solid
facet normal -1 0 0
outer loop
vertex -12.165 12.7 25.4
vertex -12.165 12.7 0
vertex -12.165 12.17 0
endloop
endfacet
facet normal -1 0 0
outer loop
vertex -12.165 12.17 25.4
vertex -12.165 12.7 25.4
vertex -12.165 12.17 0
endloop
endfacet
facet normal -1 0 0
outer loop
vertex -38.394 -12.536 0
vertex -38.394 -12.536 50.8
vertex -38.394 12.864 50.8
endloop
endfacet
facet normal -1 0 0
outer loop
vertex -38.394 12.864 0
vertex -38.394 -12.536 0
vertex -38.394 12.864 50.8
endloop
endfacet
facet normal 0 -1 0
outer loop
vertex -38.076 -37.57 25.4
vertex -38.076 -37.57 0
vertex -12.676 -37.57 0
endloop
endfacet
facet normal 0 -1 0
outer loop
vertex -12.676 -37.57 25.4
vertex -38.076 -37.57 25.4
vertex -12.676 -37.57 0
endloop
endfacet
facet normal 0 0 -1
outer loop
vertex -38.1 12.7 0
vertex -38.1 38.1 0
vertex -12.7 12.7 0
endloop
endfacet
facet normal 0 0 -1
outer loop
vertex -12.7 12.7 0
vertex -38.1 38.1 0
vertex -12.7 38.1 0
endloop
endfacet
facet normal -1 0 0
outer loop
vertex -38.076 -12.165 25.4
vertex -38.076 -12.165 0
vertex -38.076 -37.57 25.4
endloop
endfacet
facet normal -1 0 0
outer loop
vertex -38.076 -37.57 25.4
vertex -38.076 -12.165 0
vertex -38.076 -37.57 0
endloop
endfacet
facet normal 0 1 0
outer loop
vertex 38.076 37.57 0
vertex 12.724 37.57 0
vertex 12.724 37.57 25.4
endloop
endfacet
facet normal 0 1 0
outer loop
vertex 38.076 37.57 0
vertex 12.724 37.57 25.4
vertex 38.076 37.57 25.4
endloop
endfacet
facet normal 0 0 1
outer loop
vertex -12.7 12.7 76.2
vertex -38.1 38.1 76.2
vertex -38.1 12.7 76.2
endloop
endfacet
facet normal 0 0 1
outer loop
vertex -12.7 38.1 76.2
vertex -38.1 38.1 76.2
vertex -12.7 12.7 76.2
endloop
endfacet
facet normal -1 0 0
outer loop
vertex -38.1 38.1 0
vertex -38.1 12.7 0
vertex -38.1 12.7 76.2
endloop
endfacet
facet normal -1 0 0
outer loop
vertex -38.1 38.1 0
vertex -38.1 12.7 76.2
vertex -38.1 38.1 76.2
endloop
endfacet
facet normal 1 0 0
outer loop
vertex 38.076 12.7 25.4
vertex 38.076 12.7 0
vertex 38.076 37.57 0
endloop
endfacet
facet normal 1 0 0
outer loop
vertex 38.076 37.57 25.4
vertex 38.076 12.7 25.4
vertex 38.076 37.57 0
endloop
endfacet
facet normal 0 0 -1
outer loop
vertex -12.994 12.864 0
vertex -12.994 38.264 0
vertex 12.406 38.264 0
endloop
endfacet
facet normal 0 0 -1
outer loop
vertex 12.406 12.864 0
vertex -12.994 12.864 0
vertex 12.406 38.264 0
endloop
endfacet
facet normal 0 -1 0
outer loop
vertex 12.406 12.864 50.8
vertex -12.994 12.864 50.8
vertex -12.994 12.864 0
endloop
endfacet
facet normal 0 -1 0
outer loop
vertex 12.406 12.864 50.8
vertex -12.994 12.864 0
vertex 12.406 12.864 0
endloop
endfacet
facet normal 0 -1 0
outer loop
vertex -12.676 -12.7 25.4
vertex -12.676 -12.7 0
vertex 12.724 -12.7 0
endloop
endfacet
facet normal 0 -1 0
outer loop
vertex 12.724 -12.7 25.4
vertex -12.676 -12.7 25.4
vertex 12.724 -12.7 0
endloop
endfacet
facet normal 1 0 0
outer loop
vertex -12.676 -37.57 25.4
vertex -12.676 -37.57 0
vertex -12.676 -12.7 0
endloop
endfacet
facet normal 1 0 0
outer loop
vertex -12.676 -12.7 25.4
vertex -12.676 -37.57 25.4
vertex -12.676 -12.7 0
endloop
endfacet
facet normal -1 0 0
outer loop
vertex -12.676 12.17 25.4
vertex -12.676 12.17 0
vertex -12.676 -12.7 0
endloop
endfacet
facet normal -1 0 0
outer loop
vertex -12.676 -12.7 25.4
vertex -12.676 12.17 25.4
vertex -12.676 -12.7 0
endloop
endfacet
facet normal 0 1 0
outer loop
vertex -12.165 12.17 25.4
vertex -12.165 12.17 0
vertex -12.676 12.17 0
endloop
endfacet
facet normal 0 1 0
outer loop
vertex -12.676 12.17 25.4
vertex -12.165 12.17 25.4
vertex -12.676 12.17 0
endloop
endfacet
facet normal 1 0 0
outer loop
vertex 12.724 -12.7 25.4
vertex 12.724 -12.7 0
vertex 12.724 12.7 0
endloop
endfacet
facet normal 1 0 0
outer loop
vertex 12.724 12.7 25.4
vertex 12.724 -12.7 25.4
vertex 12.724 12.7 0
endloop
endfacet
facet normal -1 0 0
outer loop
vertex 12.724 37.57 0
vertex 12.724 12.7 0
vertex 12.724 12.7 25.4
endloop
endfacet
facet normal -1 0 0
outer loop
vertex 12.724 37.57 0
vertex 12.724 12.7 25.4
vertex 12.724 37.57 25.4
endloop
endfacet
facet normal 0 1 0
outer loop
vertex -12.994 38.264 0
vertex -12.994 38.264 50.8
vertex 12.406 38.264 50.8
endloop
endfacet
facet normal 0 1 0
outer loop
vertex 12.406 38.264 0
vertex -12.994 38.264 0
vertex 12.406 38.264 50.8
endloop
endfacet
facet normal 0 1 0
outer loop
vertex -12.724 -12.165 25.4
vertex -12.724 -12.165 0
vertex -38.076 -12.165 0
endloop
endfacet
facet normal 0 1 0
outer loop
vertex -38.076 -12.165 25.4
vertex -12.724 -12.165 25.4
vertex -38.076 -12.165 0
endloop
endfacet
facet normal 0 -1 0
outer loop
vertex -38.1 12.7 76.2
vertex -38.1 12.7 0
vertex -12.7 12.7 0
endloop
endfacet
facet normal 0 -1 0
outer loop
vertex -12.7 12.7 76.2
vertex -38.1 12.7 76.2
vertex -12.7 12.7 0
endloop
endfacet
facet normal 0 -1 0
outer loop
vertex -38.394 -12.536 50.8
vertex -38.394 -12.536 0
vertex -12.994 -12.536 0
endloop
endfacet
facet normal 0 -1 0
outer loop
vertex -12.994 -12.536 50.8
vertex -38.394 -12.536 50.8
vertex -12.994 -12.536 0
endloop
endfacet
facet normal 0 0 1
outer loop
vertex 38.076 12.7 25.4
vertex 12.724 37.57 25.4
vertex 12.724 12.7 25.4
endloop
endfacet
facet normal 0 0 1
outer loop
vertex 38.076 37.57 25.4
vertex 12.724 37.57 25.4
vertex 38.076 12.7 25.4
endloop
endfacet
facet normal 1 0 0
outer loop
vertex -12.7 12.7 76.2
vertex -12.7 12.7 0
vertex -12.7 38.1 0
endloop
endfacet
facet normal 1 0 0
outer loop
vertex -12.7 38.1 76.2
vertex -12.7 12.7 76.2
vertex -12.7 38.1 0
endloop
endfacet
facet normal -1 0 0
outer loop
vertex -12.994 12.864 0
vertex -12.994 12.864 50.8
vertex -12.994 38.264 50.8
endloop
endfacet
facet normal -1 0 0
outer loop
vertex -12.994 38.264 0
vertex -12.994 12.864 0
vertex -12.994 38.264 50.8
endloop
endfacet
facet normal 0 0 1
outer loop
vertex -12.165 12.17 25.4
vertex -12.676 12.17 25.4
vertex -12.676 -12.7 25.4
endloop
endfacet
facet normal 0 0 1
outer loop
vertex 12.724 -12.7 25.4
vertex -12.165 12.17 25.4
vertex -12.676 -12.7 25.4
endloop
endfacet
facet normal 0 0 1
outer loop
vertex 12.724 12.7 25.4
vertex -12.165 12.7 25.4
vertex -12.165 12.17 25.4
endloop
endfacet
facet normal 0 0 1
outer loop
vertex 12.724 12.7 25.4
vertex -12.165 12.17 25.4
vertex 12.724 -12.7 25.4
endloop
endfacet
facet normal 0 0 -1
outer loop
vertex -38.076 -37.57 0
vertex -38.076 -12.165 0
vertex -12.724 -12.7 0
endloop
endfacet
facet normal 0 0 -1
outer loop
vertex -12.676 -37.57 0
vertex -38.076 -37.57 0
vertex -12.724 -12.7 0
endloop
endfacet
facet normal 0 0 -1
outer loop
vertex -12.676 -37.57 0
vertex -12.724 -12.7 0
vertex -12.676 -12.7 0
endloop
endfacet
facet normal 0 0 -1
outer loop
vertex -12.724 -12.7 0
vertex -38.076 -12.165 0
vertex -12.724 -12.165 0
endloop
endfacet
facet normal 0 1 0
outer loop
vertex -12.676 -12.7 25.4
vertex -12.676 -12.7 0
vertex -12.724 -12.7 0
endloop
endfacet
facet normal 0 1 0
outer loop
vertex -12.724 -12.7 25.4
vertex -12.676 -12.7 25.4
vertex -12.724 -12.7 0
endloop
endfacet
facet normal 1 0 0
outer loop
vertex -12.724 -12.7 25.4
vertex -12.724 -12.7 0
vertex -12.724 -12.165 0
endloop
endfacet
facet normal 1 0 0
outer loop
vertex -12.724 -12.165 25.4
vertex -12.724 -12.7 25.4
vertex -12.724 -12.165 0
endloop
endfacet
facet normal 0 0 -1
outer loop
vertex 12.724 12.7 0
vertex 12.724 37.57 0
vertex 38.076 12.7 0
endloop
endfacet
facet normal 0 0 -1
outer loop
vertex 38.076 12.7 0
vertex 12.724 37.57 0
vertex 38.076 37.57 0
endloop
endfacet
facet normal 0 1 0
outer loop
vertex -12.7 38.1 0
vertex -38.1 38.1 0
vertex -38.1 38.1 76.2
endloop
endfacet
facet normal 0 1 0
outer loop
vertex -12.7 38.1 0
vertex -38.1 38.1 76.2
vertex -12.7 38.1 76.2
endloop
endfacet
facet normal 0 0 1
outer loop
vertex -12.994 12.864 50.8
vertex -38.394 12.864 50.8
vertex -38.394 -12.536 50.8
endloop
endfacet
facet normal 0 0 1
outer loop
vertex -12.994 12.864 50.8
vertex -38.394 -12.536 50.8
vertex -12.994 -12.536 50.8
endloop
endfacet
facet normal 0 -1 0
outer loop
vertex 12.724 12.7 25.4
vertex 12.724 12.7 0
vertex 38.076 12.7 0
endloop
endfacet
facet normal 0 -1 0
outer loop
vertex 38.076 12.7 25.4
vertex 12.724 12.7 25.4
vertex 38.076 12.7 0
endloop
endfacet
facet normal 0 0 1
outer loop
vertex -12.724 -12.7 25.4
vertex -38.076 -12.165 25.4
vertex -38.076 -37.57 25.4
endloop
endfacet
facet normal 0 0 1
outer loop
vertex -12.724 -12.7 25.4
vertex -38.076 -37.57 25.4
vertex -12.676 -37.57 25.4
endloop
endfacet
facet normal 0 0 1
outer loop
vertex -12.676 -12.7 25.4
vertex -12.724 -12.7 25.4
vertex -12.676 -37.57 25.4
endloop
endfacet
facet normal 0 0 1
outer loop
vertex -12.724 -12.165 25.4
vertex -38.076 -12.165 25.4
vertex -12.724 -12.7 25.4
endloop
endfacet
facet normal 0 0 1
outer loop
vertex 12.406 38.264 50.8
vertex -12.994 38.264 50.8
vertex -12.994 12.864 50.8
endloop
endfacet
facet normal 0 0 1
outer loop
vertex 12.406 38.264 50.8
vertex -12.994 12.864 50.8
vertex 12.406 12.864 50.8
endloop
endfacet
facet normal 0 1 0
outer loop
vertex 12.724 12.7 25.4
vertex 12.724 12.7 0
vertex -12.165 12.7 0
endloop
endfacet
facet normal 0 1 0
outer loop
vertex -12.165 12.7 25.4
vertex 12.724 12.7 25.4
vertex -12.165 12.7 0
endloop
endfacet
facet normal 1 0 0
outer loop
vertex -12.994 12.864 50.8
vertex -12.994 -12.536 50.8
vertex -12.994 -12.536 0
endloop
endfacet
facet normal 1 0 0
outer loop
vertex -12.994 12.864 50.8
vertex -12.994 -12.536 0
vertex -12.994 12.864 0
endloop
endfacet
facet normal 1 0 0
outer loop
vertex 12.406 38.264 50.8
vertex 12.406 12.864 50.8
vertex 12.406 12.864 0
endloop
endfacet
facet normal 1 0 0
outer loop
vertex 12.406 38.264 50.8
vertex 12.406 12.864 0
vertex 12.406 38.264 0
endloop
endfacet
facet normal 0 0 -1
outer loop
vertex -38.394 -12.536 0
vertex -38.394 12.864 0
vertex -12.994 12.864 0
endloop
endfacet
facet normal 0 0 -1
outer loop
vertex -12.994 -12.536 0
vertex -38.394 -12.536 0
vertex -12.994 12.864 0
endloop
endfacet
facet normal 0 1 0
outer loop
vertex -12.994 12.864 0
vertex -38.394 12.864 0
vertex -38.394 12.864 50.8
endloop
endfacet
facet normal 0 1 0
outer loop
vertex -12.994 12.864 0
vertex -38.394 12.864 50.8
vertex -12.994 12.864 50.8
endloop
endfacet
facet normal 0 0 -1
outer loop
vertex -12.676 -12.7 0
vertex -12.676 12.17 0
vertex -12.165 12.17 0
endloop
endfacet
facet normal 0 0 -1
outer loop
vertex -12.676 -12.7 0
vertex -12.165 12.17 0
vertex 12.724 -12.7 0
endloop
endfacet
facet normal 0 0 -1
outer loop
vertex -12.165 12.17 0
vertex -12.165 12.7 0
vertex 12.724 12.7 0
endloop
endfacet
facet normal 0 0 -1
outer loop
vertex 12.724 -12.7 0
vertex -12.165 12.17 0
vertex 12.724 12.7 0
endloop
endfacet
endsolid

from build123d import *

# Parameters (mm, degrees)
F0_W     = 25.3514568745
F0_H     = 24.869726705
F1_DEPTH = 25.4
F2_W     = 25.4
F2_H     = 25.4
F3_DEPTH = 50.8
F4_W     = 25.4
F4_H     = 25.4
F5_DEPTH = 76.2


with BuildPart() as f1:
    # F0 (on Top) → F1 (new body)
    with BuildSketch(Plane.XY):
        with Locations((25.4, 25.1348633525)):
            Rectangle(F0_W, F0_H)
    extrude(amount=F1_DEPTH)


with BuildPart() as f1b:
    # F0 (on Top) → F1, piece 2 (new body)
    with BuildSketch(Plane.XY):
        Polygon((-12.7242715627, -12.1654834284), (-38.0757284373, -12.1654834284), (-38.0757284373, -37.569726705), (-12.6757284373, -37.569726705), (-12.6757284373, -12.7), (-12.7242715627, -12.7), align=None)
    extrude(amount=F1_DEPTH)


with BuildPart() as f1c:
    # F0 (on Top) → F1, piece 3 (new body)
    with BuildSketch(Plane.XY):
        Polygon((12.7242715627, 12.7), (-12.1654834284, 12.7), (-12.1654834284, 12.169726705), (-12.6757284373, 12.169726705), (-12.6757284373, -12.1654834284), (-12.6757284373, -12.7), (12.7242715627, -12.7), align=None)
    extrude(amount=F1_DEPTH)


with BuildPart() as f3:
    # F2 (on Top) → F3 (new body)
    with BuildSketch(Plane.XY):
        with Locations((-25.694198918, 0.1644869)):
            Rectangle(F2_W, F2_H)
    extrude(amount=F3_DEPTH)


with BuildPart() as f3b:
    # F2 (on Top) → F3, piece 2 (new body)
    with BuildSketch(Plane.XY):
        with Locations((-0.294198918, 25.5644869)):
            Rectangle(F2_W, F2_H)
    extrude(amount=F3_DEPTH)


with BuildPart() as f5:
    # F4 (on Top) → F5 (new body)
    with BuildSketch(Plane.XY):
        with Locations((-25.4, 25.4)):
            Rectangle(F4_W, F4_H)
    extrude(amount=F5_DEPTH)


solid = Compound([f1.part, f1b.part, f1c.part, f3.part, f3b.part, f5.part])
